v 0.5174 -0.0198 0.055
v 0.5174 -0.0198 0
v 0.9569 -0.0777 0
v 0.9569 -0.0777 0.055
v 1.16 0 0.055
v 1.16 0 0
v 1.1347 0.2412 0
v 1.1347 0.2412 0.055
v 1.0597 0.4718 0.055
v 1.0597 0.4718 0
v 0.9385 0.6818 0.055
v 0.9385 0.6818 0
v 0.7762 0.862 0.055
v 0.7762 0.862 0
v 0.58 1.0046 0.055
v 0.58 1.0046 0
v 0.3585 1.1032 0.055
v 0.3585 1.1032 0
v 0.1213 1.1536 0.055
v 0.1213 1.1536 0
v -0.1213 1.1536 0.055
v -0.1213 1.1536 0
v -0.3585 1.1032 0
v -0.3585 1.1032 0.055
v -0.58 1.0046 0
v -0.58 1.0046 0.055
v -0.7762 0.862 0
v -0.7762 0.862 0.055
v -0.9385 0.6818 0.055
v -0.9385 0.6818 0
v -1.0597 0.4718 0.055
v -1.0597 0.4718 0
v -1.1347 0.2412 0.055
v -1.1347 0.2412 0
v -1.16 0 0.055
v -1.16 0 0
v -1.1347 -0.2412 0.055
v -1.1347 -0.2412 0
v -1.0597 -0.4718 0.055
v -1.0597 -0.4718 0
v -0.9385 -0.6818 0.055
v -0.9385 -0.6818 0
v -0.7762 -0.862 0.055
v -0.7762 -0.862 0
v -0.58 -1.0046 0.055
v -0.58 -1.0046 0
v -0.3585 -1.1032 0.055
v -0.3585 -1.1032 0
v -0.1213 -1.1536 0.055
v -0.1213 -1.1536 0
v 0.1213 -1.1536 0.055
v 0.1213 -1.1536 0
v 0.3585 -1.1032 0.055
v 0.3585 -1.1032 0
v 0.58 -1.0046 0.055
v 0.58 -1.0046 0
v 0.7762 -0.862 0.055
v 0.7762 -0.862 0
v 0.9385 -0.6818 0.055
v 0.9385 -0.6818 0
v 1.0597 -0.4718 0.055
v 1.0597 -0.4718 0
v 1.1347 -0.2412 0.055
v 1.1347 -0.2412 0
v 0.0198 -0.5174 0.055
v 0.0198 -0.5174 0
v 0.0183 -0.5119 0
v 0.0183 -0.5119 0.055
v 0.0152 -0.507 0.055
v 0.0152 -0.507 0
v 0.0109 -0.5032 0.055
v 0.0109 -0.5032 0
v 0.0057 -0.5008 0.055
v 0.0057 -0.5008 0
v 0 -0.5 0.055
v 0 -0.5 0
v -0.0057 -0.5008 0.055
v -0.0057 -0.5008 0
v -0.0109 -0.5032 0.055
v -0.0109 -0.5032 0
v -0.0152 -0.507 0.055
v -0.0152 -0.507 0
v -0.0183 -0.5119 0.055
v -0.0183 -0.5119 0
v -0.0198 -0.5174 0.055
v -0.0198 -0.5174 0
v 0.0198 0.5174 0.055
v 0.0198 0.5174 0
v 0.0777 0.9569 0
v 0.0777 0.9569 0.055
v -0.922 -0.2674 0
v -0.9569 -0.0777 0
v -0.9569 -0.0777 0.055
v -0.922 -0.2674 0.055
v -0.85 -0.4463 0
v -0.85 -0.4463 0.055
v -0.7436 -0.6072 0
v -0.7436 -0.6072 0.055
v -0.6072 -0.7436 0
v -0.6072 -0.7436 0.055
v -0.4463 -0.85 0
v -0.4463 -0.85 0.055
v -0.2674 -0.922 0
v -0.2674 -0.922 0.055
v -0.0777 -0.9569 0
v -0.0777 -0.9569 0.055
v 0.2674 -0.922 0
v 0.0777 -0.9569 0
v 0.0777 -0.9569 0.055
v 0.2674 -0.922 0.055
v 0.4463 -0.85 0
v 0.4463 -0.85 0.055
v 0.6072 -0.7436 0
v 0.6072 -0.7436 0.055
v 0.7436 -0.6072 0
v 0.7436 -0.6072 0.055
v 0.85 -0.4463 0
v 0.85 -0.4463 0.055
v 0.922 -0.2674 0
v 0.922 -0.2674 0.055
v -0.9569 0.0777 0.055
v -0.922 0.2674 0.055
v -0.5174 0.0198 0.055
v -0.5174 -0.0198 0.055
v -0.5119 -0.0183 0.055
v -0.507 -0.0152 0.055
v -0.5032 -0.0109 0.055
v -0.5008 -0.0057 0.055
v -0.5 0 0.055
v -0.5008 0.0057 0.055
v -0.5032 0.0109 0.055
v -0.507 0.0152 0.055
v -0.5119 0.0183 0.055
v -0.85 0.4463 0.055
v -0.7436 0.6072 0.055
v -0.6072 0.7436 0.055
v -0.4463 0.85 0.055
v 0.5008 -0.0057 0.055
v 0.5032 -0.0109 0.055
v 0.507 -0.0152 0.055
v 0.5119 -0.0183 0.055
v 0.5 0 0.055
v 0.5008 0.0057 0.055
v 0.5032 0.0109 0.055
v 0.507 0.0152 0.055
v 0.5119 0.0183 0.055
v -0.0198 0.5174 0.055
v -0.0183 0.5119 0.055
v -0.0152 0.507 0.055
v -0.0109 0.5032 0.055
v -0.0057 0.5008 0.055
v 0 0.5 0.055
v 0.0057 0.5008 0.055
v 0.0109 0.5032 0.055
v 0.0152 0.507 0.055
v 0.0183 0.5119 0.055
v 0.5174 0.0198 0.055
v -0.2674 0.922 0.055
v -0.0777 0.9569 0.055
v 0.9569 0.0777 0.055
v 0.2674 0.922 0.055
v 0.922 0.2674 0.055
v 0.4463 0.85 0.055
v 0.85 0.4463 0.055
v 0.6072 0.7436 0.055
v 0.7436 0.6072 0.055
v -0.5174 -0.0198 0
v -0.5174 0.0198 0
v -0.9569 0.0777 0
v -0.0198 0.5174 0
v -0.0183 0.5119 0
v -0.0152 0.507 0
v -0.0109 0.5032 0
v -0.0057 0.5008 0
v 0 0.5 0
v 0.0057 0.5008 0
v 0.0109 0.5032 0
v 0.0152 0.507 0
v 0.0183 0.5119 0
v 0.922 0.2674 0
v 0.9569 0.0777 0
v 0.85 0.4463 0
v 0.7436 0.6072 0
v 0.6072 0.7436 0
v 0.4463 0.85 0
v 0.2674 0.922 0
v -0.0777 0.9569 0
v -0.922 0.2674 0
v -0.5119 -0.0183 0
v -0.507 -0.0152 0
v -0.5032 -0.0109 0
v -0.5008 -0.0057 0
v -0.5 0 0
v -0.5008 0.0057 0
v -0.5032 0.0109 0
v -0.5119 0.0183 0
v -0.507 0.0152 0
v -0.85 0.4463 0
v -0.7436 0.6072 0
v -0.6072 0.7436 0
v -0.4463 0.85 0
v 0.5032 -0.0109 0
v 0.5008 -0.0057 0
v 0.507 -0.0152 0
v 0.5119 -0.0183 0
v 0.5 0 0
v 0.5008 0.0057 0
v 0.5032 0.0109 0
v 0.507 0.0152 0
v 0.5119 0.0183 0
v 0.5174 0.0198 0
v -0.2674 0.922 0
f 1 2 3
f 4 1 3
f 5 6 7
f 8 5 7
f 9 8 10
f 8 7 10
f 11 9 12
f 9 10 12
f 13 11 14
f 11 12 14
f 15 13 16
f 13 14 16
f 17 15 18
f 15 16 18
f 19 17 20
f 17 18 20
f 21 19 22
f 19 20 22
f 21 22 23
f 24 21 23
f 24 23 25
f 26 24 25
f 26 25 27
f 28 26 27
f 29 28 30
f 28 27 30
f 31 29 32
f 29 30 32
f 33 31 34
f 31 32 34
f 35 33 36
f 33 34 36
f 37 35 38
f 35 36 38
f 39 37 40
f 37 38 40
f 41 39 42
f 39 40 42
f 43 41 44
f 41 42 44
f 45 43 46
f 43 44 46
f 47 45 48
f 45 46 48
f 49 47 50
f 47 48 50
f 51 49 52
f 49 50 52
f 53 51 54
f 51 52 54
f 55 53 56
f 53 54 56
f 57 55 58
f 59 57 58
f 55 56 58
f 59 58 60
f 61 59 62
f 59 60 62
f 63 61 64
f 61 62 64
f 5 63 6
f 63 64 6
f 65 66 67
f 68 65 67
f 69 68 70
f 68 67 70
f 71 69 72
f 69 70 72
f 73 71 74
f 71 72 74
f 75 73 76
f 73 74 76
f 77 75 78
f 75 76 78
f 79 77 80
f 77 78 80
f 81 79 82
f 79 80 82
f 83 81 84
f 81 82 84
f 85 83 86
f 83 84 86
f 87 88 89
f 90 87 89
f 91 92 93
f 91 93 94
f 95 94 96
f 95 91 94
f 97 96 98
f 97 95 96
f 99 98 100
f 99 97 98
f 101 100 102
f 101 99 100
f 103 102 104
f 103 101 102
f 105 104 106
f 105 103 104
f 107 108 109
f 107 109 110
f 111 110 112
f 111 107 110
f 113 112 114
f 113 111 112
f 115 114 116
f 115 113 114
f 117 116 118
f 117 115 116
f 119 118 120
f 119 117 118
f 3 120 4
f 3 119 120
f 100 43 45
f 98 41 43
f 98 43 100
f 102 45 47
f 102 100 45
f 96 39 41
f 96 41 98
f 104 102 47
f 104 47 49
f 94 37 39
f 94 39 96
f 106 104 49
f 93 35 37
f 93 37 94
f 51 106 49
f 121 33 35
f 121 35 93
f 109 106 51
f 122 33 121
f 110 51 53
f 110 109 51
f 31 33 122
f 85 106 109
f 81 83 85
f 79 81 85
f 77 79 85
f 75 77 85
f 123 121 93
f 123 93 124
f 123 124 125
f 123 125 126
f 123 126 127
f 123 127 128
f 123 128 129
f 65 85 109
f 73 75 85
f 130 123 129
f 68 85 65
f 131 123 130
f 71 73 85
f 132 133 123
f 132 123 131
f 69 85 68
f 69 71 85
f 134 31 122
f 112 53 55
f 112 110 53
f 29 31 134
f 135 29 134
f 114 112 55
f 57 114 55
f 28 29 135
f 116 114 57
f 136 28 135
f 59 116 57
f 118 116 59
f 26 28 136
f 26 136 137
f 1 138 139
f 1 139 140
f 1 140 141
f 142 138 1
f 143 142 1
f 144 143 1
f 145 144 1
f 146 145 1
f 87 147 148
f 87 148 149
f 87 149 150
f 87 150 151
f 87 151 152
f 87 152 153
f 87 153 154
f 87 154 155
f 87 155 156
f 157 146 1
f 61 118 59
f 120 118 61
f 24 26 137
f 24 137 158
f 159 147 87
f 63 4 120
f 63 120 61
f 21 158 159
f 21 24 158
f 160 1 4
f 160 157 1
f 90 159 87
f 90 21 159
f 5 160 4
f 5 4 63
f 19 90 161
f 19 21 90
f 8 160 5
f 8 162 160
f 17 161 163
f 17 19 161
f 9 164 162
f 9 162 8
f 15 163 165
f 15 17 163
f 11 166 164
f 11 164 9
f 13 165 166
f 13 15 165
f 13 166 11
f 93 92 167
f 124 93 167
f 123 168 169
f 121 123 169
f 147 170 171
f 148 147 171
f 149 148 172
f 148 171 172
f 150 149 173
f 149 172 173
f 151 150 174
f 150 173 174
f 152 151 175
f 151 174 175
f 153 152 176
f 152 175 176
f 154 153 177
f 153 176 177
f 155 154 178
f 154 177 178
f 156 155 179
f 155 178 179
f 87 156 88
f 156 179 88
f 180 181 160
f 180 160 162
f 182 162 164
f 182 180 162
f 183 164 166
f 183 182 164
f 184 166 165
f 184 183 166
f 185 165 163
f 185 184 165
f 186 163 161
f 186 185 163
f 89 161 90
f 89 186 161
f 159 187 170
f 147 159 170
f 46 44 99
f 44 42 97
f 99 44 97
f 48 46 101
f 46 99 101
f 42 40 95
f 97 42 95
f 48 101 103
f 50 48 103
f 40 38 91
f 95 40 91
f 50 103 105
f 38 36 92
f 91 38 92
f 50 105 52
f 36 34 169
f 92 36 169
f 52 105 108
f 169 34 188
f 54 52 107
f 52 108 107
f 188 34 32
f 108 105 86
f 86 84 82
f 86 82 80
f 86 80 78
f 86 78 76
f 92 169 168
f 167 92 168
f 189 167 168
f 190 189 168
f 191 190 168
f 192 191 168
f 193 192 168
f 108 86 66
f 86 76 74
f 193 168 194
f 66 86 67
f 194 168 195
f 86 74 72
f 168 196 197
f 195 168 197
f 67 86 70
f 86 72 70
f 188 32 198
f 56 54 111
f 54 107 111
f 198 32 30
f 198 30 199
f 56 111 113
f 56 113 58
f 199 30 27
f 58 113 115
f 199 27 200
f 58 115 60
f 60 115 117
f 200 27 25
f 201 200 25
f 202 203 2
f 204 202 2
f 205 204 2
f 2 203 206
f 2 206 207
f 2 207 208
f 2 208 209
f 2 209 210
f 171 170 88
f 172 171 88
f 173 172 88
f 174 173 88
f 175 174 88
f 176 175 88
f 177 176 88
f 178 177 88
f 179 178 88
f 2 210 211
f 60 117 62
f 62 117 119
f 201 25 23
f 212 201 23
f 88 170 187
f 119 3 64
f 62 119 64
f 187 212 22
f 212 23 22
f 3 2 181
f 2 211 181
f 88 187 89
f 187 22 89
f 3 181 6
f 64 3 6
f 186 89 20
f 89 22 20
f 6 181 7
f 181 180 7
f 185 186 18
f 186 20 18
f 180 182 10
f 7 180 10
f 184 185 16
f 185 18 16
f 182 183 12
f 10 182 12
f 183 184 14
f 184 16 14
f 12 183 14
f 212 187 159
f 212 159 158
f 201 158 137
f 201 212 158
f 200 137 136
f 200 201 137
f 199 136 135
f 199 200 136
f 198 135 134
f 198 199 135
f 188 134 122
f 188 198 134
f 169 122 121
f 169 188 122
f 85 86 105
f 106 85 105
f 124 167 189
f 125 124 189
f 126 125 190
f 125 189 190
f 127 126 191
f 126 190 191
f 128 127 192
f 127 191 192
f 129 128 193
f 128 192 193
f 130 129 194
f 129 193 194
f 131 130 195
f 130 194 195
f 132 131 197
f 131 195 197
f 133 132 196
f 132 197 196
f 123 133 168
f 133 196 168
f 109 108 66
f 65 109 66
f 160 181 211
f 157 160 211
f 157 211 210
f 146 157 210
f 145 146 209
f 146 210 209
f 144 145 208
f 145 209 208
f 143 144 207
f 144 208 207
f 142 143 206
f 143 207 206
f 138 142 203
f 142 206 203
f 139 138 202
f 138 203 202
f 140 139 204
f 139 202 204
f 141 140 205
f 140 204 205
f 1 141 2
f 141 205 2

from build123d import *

# Parameters (mm, degrees)
SKETCH_1_R      = 1.16
SKETCH_1_R_2    = 0.96
EXTRUDE_1_DEPTH = 0.055
EXTRUDE_START   = -0.055
SKETCH_2_R      = 0.02
EXTRUDE_2_DEPTH = 0.055


with BuildPart() as part:
    # 草圖1 → 填料-伸長1 (new body)
    with BuildSketch(Plane.XY):
        Circle(SKETCH_1_R)
        Circle(SKETCH_1_R_2, mode=Mode.SUBTRACT)
    extrude(amount=EXTRUDE_1_DEPTH)

    # 草圖2 → 填料-伸長2 (add)
    with BuildSketch(Plane.XY.offset(0.055).offset(EXTRUDE_START)):
        with BuildLine():
            Line((-0.077685185, 0.956851614), (-0.019828897, 0.517389476))
            ThreePointArc((-0.019828897, 0.517389476), (-0.001308063, 0.539957178), (0.02, 0.52))
            ThreePointArc((0.02, 0.52), (0.019957178, 0.518691937), (0.019828897, 0.517389476))
            Line((0.019828897, 0.517389476), (0.077685185, 0.956851614))
            ThreePointArc((0.077685185, 0.956851614), (0, 0.96), (-0.077685185, 0.956851614))
        make_face()
        with BuildLine():
            ThreePointArc((0.96, 0), (0.959212581, 0.038874479), (0.956851614, 0.077685185))
            Line((0.956851614, 0.077685185), (0.517389476, 0.019828897))
            ThreePointArc((0.517389476, 0.019828897), (0.533186916, 0.015036796), (0.54, 0))
            ThreePointArc((0.54, 0), (0.533186916, -0.015036796), (0.517389476, -0.019828897))
            Line((0.517389476, -0.019828897), (0.956851614, -0.077685185))
            ThreePointArc((0.956851614, -0.077685185), (0.959212581, -0.038874479), (0.96, 0))
        make_face()
        with BuildLine():
            Line((-0.019828897, -0.517389476), (-0.077685185, -0.956851614))
            ThreePointArc((-0.077685185, -0.956851614), (0, -0.96), (0.077685185, -0.956851614))
            Line((0.077685185, -0.956851614), (0.019828897, -0.517389476))
            ThreePointArc((0.019828897, -0.517389476), (0.019957178, -0.518691937), (0.02, -0.52))
            ThreePointArc((0.02, -0.52), (-0.001308063, -0.539957178), (-0.019828897, -0.517389476))
        make_face()
        with BuildLine():
            Line((-0.517389476, 0.019828897), (-0.956851614, 0.077685185))
            ThreePointArc((-0.956851614, 0.077685185), (-0.96, 0), (-0.956851614, -0.077685185))
            Line((-0.956851614, -0.077685185), (-0.517389476, -0.019828897))
            ThreePointArc((-0.517389476, -0.019828897), (-0.54, 0), (-0.517389476, 0.019828897))
        make_face()
        with Locations((0, 0.52)):
            Circle(SKETCH_2_R)
        with Locations((0.52, 0)):
            Circle(SKETCH_2_R)
        with Locations((0, -0.52)):
            Circle(SKETCH_2_R)
        with Locations((-0.52, 0)):
            Circle(SKETCH_2_R)
    extrude(amount=EXTRUDE_2_DEPTH)


solid = part.part
